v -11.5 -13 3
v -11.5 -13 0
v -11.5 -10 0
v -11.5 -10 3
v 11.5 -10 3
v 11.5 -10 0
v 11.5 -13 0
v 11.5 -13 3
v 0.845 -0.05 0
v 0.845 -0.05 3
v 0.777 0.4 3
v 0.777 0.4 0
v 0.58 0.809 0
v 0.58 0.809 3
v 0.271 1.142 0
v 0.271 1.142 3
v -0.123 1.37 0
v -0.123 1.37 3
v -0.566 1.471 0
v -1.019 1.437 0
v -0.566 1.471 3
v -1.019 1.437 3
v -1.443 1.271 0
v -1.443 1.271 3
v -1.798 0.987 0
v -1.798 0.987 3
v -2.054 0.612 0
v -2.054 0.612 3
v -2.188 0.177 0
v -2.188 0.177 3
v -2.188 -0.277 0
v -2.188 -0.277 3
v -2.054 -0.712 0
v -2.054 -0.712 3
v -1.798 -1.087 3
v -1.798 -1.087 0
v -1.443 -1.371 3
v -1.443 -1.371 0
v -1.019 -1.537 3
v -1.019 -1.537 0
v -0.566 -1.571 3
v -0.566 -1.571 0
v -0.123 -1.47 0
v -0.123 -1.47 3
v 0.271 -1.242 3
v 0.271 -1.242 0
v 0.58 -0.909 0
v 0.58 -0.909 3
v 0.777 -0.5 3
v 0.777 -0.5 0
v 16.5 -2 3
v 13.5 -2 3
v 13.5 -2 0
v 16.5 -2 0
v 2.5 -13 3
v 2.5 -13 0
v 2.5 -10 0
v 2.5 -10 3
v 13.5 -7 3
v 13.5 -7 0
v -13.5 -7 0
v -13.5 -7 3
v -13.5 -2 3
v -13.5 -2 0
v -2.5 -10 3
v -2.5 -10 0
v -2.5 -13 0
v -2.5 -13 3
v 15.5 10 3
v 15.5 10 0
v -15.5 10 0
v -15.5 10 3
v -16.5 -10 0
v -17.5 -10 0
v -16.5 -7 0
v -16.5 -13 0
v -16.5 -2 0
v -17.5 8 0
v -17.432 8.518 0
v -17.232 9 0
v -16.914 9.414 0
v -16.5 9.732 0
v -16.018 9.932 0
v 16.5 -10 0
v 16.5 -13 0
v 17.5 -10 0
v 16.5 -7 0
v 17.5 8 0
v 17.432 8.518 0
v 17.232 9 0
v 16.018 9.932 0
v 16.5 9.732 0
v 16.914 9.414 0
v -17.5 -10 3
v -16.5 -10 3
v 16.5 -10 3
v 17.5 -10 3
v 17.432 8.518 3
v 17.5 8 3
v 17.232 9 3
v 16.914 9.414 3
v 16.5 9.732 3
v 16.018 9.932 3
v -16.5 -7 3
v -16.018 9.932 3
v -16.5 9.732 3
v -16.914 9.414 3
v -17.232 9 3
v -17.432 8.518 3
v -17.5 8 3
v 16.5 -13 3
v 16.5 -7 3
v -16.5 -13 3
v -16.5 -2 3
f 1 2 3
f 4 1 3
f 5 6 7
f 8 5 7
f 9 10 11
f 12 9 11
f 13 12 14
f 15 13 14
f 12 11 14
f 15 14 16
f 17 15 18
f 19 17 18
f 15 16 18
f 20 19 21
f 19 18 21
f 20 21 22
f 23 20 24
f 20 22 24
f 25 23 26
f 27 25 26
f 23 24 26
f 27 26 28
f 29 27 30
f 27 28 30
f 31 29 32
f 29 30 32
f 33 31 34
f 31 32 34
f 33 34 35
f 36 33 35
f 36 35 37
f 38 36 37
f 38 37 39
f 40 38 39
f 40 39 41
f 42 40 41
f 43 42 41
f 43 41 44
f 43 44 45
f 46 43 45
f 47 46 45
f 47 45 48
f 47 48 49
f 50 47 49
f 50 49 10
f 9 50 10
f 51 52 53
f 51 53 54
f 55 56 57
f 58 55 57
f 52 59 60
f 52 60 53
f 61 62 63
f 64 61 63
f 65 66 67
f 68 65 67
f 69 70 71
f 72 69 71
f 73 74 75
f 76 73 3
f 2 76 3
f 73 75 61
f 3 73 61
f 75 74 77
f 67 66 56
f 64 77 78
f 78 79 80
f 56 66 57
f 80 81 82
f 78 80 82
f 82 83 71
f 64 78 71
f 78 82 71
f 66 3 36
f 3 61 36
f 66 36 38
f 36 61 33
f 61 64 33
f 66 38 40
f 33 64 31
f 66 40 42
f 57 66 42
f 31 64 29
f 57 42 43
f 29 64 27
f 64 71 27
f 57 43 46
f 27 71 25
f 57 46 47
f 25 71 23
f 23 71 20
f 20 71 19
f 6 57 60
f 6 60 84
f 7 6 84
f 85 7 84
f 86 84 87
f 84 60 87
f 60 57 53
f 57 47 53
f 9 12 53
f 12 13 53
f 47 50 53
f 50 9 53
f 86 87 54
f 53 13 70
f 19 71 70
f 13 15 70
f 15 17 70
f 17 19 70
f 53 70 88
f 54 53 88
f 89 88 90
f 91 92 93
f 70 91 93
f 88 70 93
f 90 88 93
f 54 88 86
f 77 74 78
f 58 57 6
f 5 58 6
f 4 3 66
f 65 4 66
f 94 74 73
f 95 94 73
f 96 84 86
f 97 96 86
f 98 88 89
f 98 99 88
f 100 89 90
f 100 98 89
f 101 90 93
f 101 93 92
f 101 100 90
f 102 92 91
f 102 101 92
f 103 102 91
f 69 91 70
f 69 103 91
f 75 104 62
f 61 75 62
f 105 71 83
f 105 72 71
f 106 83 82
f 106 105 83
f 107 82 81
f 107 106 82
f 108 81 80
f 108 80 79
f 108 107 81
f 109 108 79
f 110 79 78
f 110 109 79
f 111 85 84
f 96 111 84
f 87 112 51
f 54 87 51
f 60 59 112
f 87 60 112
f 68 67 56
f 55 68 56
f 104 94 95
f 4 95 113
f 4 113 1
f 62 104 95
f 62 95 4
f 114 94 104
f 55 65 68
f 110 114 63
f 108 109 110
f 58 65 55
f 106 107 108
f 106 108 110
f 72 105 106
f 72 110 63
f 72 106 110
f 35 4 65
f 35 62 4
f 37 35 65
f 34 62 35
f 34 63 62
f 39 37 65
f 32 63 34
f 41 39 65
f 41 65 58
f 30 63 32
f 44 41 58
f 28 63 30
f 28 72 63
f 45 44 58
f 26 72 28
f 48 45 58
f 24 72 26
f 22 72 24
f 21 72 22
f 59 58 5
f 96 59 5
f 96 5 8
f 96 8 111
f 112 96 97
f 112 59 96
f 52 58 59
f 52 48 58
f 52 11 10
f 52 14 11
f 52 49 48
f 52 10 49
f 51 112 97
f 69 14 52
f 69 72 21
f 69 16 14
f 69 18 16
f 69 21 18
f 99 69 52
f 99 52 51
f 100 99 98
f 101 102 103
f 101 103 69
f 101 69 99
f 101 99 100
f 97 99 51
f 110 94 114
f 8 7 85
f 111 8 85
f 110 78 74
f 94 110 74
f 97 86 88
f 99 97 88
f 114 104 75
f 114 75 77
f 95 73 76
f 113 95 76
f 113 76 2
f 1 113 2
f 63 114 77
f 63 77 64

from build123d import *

# Parameters (mm, degrees)
BOSS_EXTRUDE1_DEPTH = 3
FILLET1_R           = 2
SKETCH4_R           = 1.525
SKETCH4_W           = 3
SKETCH4_H           = 5
CUT_EXTRUDE1_DEPTH  = 23.005681085


with BuildPart() as part:
    # Sketch1 → Boss-Extrude1 (new body)
    with BuildSketch(Plane.XY):
        Polygon((-11.5, -10), (-2.5, -10), (-2.5, -13), (2.5, -13), (2.5, -10), (11.5, -10), (11.5, -13), (16.5, -13), (16.5, -10), (17.5, -10), (17.5, 10), (-17.5, 10), (-17.5, -10), (-16.5, -10), (-16.5, -13), (-11.5, -13), align=None)
    extrude(amount=BOSS_EXTRUDE1_DEPTH)

    # Fillet1
    fillet1_edges = [part.edges().sort_by_distance(p)[0] for p in [
        (-17.5, 10, 1.5),
        (17.5, 10, 1.5),
    ]]
    fillet(fillet1_edges, radius=FILLET1_R)

    # Sketch4 → Cut-Extrude1 (cut, through all)
    with BuildSketch(Plane.XY.offset(3)):
        with Locations((-0.68, -0.05)):
            Circle(SKETCH4_R)
        with Locations((-15, -4.5)):
            Rectangle(SKETCH4_W, SKETCH4_H)
        with Locations((15, -4.5)):
            Rectangle(SKETCH4_W, SKETCH4_H)
    extrude(amount=-CUT_EXTRUDE1_DEPTH, mode=Mode.SUBTRACT)


solid = part.part
